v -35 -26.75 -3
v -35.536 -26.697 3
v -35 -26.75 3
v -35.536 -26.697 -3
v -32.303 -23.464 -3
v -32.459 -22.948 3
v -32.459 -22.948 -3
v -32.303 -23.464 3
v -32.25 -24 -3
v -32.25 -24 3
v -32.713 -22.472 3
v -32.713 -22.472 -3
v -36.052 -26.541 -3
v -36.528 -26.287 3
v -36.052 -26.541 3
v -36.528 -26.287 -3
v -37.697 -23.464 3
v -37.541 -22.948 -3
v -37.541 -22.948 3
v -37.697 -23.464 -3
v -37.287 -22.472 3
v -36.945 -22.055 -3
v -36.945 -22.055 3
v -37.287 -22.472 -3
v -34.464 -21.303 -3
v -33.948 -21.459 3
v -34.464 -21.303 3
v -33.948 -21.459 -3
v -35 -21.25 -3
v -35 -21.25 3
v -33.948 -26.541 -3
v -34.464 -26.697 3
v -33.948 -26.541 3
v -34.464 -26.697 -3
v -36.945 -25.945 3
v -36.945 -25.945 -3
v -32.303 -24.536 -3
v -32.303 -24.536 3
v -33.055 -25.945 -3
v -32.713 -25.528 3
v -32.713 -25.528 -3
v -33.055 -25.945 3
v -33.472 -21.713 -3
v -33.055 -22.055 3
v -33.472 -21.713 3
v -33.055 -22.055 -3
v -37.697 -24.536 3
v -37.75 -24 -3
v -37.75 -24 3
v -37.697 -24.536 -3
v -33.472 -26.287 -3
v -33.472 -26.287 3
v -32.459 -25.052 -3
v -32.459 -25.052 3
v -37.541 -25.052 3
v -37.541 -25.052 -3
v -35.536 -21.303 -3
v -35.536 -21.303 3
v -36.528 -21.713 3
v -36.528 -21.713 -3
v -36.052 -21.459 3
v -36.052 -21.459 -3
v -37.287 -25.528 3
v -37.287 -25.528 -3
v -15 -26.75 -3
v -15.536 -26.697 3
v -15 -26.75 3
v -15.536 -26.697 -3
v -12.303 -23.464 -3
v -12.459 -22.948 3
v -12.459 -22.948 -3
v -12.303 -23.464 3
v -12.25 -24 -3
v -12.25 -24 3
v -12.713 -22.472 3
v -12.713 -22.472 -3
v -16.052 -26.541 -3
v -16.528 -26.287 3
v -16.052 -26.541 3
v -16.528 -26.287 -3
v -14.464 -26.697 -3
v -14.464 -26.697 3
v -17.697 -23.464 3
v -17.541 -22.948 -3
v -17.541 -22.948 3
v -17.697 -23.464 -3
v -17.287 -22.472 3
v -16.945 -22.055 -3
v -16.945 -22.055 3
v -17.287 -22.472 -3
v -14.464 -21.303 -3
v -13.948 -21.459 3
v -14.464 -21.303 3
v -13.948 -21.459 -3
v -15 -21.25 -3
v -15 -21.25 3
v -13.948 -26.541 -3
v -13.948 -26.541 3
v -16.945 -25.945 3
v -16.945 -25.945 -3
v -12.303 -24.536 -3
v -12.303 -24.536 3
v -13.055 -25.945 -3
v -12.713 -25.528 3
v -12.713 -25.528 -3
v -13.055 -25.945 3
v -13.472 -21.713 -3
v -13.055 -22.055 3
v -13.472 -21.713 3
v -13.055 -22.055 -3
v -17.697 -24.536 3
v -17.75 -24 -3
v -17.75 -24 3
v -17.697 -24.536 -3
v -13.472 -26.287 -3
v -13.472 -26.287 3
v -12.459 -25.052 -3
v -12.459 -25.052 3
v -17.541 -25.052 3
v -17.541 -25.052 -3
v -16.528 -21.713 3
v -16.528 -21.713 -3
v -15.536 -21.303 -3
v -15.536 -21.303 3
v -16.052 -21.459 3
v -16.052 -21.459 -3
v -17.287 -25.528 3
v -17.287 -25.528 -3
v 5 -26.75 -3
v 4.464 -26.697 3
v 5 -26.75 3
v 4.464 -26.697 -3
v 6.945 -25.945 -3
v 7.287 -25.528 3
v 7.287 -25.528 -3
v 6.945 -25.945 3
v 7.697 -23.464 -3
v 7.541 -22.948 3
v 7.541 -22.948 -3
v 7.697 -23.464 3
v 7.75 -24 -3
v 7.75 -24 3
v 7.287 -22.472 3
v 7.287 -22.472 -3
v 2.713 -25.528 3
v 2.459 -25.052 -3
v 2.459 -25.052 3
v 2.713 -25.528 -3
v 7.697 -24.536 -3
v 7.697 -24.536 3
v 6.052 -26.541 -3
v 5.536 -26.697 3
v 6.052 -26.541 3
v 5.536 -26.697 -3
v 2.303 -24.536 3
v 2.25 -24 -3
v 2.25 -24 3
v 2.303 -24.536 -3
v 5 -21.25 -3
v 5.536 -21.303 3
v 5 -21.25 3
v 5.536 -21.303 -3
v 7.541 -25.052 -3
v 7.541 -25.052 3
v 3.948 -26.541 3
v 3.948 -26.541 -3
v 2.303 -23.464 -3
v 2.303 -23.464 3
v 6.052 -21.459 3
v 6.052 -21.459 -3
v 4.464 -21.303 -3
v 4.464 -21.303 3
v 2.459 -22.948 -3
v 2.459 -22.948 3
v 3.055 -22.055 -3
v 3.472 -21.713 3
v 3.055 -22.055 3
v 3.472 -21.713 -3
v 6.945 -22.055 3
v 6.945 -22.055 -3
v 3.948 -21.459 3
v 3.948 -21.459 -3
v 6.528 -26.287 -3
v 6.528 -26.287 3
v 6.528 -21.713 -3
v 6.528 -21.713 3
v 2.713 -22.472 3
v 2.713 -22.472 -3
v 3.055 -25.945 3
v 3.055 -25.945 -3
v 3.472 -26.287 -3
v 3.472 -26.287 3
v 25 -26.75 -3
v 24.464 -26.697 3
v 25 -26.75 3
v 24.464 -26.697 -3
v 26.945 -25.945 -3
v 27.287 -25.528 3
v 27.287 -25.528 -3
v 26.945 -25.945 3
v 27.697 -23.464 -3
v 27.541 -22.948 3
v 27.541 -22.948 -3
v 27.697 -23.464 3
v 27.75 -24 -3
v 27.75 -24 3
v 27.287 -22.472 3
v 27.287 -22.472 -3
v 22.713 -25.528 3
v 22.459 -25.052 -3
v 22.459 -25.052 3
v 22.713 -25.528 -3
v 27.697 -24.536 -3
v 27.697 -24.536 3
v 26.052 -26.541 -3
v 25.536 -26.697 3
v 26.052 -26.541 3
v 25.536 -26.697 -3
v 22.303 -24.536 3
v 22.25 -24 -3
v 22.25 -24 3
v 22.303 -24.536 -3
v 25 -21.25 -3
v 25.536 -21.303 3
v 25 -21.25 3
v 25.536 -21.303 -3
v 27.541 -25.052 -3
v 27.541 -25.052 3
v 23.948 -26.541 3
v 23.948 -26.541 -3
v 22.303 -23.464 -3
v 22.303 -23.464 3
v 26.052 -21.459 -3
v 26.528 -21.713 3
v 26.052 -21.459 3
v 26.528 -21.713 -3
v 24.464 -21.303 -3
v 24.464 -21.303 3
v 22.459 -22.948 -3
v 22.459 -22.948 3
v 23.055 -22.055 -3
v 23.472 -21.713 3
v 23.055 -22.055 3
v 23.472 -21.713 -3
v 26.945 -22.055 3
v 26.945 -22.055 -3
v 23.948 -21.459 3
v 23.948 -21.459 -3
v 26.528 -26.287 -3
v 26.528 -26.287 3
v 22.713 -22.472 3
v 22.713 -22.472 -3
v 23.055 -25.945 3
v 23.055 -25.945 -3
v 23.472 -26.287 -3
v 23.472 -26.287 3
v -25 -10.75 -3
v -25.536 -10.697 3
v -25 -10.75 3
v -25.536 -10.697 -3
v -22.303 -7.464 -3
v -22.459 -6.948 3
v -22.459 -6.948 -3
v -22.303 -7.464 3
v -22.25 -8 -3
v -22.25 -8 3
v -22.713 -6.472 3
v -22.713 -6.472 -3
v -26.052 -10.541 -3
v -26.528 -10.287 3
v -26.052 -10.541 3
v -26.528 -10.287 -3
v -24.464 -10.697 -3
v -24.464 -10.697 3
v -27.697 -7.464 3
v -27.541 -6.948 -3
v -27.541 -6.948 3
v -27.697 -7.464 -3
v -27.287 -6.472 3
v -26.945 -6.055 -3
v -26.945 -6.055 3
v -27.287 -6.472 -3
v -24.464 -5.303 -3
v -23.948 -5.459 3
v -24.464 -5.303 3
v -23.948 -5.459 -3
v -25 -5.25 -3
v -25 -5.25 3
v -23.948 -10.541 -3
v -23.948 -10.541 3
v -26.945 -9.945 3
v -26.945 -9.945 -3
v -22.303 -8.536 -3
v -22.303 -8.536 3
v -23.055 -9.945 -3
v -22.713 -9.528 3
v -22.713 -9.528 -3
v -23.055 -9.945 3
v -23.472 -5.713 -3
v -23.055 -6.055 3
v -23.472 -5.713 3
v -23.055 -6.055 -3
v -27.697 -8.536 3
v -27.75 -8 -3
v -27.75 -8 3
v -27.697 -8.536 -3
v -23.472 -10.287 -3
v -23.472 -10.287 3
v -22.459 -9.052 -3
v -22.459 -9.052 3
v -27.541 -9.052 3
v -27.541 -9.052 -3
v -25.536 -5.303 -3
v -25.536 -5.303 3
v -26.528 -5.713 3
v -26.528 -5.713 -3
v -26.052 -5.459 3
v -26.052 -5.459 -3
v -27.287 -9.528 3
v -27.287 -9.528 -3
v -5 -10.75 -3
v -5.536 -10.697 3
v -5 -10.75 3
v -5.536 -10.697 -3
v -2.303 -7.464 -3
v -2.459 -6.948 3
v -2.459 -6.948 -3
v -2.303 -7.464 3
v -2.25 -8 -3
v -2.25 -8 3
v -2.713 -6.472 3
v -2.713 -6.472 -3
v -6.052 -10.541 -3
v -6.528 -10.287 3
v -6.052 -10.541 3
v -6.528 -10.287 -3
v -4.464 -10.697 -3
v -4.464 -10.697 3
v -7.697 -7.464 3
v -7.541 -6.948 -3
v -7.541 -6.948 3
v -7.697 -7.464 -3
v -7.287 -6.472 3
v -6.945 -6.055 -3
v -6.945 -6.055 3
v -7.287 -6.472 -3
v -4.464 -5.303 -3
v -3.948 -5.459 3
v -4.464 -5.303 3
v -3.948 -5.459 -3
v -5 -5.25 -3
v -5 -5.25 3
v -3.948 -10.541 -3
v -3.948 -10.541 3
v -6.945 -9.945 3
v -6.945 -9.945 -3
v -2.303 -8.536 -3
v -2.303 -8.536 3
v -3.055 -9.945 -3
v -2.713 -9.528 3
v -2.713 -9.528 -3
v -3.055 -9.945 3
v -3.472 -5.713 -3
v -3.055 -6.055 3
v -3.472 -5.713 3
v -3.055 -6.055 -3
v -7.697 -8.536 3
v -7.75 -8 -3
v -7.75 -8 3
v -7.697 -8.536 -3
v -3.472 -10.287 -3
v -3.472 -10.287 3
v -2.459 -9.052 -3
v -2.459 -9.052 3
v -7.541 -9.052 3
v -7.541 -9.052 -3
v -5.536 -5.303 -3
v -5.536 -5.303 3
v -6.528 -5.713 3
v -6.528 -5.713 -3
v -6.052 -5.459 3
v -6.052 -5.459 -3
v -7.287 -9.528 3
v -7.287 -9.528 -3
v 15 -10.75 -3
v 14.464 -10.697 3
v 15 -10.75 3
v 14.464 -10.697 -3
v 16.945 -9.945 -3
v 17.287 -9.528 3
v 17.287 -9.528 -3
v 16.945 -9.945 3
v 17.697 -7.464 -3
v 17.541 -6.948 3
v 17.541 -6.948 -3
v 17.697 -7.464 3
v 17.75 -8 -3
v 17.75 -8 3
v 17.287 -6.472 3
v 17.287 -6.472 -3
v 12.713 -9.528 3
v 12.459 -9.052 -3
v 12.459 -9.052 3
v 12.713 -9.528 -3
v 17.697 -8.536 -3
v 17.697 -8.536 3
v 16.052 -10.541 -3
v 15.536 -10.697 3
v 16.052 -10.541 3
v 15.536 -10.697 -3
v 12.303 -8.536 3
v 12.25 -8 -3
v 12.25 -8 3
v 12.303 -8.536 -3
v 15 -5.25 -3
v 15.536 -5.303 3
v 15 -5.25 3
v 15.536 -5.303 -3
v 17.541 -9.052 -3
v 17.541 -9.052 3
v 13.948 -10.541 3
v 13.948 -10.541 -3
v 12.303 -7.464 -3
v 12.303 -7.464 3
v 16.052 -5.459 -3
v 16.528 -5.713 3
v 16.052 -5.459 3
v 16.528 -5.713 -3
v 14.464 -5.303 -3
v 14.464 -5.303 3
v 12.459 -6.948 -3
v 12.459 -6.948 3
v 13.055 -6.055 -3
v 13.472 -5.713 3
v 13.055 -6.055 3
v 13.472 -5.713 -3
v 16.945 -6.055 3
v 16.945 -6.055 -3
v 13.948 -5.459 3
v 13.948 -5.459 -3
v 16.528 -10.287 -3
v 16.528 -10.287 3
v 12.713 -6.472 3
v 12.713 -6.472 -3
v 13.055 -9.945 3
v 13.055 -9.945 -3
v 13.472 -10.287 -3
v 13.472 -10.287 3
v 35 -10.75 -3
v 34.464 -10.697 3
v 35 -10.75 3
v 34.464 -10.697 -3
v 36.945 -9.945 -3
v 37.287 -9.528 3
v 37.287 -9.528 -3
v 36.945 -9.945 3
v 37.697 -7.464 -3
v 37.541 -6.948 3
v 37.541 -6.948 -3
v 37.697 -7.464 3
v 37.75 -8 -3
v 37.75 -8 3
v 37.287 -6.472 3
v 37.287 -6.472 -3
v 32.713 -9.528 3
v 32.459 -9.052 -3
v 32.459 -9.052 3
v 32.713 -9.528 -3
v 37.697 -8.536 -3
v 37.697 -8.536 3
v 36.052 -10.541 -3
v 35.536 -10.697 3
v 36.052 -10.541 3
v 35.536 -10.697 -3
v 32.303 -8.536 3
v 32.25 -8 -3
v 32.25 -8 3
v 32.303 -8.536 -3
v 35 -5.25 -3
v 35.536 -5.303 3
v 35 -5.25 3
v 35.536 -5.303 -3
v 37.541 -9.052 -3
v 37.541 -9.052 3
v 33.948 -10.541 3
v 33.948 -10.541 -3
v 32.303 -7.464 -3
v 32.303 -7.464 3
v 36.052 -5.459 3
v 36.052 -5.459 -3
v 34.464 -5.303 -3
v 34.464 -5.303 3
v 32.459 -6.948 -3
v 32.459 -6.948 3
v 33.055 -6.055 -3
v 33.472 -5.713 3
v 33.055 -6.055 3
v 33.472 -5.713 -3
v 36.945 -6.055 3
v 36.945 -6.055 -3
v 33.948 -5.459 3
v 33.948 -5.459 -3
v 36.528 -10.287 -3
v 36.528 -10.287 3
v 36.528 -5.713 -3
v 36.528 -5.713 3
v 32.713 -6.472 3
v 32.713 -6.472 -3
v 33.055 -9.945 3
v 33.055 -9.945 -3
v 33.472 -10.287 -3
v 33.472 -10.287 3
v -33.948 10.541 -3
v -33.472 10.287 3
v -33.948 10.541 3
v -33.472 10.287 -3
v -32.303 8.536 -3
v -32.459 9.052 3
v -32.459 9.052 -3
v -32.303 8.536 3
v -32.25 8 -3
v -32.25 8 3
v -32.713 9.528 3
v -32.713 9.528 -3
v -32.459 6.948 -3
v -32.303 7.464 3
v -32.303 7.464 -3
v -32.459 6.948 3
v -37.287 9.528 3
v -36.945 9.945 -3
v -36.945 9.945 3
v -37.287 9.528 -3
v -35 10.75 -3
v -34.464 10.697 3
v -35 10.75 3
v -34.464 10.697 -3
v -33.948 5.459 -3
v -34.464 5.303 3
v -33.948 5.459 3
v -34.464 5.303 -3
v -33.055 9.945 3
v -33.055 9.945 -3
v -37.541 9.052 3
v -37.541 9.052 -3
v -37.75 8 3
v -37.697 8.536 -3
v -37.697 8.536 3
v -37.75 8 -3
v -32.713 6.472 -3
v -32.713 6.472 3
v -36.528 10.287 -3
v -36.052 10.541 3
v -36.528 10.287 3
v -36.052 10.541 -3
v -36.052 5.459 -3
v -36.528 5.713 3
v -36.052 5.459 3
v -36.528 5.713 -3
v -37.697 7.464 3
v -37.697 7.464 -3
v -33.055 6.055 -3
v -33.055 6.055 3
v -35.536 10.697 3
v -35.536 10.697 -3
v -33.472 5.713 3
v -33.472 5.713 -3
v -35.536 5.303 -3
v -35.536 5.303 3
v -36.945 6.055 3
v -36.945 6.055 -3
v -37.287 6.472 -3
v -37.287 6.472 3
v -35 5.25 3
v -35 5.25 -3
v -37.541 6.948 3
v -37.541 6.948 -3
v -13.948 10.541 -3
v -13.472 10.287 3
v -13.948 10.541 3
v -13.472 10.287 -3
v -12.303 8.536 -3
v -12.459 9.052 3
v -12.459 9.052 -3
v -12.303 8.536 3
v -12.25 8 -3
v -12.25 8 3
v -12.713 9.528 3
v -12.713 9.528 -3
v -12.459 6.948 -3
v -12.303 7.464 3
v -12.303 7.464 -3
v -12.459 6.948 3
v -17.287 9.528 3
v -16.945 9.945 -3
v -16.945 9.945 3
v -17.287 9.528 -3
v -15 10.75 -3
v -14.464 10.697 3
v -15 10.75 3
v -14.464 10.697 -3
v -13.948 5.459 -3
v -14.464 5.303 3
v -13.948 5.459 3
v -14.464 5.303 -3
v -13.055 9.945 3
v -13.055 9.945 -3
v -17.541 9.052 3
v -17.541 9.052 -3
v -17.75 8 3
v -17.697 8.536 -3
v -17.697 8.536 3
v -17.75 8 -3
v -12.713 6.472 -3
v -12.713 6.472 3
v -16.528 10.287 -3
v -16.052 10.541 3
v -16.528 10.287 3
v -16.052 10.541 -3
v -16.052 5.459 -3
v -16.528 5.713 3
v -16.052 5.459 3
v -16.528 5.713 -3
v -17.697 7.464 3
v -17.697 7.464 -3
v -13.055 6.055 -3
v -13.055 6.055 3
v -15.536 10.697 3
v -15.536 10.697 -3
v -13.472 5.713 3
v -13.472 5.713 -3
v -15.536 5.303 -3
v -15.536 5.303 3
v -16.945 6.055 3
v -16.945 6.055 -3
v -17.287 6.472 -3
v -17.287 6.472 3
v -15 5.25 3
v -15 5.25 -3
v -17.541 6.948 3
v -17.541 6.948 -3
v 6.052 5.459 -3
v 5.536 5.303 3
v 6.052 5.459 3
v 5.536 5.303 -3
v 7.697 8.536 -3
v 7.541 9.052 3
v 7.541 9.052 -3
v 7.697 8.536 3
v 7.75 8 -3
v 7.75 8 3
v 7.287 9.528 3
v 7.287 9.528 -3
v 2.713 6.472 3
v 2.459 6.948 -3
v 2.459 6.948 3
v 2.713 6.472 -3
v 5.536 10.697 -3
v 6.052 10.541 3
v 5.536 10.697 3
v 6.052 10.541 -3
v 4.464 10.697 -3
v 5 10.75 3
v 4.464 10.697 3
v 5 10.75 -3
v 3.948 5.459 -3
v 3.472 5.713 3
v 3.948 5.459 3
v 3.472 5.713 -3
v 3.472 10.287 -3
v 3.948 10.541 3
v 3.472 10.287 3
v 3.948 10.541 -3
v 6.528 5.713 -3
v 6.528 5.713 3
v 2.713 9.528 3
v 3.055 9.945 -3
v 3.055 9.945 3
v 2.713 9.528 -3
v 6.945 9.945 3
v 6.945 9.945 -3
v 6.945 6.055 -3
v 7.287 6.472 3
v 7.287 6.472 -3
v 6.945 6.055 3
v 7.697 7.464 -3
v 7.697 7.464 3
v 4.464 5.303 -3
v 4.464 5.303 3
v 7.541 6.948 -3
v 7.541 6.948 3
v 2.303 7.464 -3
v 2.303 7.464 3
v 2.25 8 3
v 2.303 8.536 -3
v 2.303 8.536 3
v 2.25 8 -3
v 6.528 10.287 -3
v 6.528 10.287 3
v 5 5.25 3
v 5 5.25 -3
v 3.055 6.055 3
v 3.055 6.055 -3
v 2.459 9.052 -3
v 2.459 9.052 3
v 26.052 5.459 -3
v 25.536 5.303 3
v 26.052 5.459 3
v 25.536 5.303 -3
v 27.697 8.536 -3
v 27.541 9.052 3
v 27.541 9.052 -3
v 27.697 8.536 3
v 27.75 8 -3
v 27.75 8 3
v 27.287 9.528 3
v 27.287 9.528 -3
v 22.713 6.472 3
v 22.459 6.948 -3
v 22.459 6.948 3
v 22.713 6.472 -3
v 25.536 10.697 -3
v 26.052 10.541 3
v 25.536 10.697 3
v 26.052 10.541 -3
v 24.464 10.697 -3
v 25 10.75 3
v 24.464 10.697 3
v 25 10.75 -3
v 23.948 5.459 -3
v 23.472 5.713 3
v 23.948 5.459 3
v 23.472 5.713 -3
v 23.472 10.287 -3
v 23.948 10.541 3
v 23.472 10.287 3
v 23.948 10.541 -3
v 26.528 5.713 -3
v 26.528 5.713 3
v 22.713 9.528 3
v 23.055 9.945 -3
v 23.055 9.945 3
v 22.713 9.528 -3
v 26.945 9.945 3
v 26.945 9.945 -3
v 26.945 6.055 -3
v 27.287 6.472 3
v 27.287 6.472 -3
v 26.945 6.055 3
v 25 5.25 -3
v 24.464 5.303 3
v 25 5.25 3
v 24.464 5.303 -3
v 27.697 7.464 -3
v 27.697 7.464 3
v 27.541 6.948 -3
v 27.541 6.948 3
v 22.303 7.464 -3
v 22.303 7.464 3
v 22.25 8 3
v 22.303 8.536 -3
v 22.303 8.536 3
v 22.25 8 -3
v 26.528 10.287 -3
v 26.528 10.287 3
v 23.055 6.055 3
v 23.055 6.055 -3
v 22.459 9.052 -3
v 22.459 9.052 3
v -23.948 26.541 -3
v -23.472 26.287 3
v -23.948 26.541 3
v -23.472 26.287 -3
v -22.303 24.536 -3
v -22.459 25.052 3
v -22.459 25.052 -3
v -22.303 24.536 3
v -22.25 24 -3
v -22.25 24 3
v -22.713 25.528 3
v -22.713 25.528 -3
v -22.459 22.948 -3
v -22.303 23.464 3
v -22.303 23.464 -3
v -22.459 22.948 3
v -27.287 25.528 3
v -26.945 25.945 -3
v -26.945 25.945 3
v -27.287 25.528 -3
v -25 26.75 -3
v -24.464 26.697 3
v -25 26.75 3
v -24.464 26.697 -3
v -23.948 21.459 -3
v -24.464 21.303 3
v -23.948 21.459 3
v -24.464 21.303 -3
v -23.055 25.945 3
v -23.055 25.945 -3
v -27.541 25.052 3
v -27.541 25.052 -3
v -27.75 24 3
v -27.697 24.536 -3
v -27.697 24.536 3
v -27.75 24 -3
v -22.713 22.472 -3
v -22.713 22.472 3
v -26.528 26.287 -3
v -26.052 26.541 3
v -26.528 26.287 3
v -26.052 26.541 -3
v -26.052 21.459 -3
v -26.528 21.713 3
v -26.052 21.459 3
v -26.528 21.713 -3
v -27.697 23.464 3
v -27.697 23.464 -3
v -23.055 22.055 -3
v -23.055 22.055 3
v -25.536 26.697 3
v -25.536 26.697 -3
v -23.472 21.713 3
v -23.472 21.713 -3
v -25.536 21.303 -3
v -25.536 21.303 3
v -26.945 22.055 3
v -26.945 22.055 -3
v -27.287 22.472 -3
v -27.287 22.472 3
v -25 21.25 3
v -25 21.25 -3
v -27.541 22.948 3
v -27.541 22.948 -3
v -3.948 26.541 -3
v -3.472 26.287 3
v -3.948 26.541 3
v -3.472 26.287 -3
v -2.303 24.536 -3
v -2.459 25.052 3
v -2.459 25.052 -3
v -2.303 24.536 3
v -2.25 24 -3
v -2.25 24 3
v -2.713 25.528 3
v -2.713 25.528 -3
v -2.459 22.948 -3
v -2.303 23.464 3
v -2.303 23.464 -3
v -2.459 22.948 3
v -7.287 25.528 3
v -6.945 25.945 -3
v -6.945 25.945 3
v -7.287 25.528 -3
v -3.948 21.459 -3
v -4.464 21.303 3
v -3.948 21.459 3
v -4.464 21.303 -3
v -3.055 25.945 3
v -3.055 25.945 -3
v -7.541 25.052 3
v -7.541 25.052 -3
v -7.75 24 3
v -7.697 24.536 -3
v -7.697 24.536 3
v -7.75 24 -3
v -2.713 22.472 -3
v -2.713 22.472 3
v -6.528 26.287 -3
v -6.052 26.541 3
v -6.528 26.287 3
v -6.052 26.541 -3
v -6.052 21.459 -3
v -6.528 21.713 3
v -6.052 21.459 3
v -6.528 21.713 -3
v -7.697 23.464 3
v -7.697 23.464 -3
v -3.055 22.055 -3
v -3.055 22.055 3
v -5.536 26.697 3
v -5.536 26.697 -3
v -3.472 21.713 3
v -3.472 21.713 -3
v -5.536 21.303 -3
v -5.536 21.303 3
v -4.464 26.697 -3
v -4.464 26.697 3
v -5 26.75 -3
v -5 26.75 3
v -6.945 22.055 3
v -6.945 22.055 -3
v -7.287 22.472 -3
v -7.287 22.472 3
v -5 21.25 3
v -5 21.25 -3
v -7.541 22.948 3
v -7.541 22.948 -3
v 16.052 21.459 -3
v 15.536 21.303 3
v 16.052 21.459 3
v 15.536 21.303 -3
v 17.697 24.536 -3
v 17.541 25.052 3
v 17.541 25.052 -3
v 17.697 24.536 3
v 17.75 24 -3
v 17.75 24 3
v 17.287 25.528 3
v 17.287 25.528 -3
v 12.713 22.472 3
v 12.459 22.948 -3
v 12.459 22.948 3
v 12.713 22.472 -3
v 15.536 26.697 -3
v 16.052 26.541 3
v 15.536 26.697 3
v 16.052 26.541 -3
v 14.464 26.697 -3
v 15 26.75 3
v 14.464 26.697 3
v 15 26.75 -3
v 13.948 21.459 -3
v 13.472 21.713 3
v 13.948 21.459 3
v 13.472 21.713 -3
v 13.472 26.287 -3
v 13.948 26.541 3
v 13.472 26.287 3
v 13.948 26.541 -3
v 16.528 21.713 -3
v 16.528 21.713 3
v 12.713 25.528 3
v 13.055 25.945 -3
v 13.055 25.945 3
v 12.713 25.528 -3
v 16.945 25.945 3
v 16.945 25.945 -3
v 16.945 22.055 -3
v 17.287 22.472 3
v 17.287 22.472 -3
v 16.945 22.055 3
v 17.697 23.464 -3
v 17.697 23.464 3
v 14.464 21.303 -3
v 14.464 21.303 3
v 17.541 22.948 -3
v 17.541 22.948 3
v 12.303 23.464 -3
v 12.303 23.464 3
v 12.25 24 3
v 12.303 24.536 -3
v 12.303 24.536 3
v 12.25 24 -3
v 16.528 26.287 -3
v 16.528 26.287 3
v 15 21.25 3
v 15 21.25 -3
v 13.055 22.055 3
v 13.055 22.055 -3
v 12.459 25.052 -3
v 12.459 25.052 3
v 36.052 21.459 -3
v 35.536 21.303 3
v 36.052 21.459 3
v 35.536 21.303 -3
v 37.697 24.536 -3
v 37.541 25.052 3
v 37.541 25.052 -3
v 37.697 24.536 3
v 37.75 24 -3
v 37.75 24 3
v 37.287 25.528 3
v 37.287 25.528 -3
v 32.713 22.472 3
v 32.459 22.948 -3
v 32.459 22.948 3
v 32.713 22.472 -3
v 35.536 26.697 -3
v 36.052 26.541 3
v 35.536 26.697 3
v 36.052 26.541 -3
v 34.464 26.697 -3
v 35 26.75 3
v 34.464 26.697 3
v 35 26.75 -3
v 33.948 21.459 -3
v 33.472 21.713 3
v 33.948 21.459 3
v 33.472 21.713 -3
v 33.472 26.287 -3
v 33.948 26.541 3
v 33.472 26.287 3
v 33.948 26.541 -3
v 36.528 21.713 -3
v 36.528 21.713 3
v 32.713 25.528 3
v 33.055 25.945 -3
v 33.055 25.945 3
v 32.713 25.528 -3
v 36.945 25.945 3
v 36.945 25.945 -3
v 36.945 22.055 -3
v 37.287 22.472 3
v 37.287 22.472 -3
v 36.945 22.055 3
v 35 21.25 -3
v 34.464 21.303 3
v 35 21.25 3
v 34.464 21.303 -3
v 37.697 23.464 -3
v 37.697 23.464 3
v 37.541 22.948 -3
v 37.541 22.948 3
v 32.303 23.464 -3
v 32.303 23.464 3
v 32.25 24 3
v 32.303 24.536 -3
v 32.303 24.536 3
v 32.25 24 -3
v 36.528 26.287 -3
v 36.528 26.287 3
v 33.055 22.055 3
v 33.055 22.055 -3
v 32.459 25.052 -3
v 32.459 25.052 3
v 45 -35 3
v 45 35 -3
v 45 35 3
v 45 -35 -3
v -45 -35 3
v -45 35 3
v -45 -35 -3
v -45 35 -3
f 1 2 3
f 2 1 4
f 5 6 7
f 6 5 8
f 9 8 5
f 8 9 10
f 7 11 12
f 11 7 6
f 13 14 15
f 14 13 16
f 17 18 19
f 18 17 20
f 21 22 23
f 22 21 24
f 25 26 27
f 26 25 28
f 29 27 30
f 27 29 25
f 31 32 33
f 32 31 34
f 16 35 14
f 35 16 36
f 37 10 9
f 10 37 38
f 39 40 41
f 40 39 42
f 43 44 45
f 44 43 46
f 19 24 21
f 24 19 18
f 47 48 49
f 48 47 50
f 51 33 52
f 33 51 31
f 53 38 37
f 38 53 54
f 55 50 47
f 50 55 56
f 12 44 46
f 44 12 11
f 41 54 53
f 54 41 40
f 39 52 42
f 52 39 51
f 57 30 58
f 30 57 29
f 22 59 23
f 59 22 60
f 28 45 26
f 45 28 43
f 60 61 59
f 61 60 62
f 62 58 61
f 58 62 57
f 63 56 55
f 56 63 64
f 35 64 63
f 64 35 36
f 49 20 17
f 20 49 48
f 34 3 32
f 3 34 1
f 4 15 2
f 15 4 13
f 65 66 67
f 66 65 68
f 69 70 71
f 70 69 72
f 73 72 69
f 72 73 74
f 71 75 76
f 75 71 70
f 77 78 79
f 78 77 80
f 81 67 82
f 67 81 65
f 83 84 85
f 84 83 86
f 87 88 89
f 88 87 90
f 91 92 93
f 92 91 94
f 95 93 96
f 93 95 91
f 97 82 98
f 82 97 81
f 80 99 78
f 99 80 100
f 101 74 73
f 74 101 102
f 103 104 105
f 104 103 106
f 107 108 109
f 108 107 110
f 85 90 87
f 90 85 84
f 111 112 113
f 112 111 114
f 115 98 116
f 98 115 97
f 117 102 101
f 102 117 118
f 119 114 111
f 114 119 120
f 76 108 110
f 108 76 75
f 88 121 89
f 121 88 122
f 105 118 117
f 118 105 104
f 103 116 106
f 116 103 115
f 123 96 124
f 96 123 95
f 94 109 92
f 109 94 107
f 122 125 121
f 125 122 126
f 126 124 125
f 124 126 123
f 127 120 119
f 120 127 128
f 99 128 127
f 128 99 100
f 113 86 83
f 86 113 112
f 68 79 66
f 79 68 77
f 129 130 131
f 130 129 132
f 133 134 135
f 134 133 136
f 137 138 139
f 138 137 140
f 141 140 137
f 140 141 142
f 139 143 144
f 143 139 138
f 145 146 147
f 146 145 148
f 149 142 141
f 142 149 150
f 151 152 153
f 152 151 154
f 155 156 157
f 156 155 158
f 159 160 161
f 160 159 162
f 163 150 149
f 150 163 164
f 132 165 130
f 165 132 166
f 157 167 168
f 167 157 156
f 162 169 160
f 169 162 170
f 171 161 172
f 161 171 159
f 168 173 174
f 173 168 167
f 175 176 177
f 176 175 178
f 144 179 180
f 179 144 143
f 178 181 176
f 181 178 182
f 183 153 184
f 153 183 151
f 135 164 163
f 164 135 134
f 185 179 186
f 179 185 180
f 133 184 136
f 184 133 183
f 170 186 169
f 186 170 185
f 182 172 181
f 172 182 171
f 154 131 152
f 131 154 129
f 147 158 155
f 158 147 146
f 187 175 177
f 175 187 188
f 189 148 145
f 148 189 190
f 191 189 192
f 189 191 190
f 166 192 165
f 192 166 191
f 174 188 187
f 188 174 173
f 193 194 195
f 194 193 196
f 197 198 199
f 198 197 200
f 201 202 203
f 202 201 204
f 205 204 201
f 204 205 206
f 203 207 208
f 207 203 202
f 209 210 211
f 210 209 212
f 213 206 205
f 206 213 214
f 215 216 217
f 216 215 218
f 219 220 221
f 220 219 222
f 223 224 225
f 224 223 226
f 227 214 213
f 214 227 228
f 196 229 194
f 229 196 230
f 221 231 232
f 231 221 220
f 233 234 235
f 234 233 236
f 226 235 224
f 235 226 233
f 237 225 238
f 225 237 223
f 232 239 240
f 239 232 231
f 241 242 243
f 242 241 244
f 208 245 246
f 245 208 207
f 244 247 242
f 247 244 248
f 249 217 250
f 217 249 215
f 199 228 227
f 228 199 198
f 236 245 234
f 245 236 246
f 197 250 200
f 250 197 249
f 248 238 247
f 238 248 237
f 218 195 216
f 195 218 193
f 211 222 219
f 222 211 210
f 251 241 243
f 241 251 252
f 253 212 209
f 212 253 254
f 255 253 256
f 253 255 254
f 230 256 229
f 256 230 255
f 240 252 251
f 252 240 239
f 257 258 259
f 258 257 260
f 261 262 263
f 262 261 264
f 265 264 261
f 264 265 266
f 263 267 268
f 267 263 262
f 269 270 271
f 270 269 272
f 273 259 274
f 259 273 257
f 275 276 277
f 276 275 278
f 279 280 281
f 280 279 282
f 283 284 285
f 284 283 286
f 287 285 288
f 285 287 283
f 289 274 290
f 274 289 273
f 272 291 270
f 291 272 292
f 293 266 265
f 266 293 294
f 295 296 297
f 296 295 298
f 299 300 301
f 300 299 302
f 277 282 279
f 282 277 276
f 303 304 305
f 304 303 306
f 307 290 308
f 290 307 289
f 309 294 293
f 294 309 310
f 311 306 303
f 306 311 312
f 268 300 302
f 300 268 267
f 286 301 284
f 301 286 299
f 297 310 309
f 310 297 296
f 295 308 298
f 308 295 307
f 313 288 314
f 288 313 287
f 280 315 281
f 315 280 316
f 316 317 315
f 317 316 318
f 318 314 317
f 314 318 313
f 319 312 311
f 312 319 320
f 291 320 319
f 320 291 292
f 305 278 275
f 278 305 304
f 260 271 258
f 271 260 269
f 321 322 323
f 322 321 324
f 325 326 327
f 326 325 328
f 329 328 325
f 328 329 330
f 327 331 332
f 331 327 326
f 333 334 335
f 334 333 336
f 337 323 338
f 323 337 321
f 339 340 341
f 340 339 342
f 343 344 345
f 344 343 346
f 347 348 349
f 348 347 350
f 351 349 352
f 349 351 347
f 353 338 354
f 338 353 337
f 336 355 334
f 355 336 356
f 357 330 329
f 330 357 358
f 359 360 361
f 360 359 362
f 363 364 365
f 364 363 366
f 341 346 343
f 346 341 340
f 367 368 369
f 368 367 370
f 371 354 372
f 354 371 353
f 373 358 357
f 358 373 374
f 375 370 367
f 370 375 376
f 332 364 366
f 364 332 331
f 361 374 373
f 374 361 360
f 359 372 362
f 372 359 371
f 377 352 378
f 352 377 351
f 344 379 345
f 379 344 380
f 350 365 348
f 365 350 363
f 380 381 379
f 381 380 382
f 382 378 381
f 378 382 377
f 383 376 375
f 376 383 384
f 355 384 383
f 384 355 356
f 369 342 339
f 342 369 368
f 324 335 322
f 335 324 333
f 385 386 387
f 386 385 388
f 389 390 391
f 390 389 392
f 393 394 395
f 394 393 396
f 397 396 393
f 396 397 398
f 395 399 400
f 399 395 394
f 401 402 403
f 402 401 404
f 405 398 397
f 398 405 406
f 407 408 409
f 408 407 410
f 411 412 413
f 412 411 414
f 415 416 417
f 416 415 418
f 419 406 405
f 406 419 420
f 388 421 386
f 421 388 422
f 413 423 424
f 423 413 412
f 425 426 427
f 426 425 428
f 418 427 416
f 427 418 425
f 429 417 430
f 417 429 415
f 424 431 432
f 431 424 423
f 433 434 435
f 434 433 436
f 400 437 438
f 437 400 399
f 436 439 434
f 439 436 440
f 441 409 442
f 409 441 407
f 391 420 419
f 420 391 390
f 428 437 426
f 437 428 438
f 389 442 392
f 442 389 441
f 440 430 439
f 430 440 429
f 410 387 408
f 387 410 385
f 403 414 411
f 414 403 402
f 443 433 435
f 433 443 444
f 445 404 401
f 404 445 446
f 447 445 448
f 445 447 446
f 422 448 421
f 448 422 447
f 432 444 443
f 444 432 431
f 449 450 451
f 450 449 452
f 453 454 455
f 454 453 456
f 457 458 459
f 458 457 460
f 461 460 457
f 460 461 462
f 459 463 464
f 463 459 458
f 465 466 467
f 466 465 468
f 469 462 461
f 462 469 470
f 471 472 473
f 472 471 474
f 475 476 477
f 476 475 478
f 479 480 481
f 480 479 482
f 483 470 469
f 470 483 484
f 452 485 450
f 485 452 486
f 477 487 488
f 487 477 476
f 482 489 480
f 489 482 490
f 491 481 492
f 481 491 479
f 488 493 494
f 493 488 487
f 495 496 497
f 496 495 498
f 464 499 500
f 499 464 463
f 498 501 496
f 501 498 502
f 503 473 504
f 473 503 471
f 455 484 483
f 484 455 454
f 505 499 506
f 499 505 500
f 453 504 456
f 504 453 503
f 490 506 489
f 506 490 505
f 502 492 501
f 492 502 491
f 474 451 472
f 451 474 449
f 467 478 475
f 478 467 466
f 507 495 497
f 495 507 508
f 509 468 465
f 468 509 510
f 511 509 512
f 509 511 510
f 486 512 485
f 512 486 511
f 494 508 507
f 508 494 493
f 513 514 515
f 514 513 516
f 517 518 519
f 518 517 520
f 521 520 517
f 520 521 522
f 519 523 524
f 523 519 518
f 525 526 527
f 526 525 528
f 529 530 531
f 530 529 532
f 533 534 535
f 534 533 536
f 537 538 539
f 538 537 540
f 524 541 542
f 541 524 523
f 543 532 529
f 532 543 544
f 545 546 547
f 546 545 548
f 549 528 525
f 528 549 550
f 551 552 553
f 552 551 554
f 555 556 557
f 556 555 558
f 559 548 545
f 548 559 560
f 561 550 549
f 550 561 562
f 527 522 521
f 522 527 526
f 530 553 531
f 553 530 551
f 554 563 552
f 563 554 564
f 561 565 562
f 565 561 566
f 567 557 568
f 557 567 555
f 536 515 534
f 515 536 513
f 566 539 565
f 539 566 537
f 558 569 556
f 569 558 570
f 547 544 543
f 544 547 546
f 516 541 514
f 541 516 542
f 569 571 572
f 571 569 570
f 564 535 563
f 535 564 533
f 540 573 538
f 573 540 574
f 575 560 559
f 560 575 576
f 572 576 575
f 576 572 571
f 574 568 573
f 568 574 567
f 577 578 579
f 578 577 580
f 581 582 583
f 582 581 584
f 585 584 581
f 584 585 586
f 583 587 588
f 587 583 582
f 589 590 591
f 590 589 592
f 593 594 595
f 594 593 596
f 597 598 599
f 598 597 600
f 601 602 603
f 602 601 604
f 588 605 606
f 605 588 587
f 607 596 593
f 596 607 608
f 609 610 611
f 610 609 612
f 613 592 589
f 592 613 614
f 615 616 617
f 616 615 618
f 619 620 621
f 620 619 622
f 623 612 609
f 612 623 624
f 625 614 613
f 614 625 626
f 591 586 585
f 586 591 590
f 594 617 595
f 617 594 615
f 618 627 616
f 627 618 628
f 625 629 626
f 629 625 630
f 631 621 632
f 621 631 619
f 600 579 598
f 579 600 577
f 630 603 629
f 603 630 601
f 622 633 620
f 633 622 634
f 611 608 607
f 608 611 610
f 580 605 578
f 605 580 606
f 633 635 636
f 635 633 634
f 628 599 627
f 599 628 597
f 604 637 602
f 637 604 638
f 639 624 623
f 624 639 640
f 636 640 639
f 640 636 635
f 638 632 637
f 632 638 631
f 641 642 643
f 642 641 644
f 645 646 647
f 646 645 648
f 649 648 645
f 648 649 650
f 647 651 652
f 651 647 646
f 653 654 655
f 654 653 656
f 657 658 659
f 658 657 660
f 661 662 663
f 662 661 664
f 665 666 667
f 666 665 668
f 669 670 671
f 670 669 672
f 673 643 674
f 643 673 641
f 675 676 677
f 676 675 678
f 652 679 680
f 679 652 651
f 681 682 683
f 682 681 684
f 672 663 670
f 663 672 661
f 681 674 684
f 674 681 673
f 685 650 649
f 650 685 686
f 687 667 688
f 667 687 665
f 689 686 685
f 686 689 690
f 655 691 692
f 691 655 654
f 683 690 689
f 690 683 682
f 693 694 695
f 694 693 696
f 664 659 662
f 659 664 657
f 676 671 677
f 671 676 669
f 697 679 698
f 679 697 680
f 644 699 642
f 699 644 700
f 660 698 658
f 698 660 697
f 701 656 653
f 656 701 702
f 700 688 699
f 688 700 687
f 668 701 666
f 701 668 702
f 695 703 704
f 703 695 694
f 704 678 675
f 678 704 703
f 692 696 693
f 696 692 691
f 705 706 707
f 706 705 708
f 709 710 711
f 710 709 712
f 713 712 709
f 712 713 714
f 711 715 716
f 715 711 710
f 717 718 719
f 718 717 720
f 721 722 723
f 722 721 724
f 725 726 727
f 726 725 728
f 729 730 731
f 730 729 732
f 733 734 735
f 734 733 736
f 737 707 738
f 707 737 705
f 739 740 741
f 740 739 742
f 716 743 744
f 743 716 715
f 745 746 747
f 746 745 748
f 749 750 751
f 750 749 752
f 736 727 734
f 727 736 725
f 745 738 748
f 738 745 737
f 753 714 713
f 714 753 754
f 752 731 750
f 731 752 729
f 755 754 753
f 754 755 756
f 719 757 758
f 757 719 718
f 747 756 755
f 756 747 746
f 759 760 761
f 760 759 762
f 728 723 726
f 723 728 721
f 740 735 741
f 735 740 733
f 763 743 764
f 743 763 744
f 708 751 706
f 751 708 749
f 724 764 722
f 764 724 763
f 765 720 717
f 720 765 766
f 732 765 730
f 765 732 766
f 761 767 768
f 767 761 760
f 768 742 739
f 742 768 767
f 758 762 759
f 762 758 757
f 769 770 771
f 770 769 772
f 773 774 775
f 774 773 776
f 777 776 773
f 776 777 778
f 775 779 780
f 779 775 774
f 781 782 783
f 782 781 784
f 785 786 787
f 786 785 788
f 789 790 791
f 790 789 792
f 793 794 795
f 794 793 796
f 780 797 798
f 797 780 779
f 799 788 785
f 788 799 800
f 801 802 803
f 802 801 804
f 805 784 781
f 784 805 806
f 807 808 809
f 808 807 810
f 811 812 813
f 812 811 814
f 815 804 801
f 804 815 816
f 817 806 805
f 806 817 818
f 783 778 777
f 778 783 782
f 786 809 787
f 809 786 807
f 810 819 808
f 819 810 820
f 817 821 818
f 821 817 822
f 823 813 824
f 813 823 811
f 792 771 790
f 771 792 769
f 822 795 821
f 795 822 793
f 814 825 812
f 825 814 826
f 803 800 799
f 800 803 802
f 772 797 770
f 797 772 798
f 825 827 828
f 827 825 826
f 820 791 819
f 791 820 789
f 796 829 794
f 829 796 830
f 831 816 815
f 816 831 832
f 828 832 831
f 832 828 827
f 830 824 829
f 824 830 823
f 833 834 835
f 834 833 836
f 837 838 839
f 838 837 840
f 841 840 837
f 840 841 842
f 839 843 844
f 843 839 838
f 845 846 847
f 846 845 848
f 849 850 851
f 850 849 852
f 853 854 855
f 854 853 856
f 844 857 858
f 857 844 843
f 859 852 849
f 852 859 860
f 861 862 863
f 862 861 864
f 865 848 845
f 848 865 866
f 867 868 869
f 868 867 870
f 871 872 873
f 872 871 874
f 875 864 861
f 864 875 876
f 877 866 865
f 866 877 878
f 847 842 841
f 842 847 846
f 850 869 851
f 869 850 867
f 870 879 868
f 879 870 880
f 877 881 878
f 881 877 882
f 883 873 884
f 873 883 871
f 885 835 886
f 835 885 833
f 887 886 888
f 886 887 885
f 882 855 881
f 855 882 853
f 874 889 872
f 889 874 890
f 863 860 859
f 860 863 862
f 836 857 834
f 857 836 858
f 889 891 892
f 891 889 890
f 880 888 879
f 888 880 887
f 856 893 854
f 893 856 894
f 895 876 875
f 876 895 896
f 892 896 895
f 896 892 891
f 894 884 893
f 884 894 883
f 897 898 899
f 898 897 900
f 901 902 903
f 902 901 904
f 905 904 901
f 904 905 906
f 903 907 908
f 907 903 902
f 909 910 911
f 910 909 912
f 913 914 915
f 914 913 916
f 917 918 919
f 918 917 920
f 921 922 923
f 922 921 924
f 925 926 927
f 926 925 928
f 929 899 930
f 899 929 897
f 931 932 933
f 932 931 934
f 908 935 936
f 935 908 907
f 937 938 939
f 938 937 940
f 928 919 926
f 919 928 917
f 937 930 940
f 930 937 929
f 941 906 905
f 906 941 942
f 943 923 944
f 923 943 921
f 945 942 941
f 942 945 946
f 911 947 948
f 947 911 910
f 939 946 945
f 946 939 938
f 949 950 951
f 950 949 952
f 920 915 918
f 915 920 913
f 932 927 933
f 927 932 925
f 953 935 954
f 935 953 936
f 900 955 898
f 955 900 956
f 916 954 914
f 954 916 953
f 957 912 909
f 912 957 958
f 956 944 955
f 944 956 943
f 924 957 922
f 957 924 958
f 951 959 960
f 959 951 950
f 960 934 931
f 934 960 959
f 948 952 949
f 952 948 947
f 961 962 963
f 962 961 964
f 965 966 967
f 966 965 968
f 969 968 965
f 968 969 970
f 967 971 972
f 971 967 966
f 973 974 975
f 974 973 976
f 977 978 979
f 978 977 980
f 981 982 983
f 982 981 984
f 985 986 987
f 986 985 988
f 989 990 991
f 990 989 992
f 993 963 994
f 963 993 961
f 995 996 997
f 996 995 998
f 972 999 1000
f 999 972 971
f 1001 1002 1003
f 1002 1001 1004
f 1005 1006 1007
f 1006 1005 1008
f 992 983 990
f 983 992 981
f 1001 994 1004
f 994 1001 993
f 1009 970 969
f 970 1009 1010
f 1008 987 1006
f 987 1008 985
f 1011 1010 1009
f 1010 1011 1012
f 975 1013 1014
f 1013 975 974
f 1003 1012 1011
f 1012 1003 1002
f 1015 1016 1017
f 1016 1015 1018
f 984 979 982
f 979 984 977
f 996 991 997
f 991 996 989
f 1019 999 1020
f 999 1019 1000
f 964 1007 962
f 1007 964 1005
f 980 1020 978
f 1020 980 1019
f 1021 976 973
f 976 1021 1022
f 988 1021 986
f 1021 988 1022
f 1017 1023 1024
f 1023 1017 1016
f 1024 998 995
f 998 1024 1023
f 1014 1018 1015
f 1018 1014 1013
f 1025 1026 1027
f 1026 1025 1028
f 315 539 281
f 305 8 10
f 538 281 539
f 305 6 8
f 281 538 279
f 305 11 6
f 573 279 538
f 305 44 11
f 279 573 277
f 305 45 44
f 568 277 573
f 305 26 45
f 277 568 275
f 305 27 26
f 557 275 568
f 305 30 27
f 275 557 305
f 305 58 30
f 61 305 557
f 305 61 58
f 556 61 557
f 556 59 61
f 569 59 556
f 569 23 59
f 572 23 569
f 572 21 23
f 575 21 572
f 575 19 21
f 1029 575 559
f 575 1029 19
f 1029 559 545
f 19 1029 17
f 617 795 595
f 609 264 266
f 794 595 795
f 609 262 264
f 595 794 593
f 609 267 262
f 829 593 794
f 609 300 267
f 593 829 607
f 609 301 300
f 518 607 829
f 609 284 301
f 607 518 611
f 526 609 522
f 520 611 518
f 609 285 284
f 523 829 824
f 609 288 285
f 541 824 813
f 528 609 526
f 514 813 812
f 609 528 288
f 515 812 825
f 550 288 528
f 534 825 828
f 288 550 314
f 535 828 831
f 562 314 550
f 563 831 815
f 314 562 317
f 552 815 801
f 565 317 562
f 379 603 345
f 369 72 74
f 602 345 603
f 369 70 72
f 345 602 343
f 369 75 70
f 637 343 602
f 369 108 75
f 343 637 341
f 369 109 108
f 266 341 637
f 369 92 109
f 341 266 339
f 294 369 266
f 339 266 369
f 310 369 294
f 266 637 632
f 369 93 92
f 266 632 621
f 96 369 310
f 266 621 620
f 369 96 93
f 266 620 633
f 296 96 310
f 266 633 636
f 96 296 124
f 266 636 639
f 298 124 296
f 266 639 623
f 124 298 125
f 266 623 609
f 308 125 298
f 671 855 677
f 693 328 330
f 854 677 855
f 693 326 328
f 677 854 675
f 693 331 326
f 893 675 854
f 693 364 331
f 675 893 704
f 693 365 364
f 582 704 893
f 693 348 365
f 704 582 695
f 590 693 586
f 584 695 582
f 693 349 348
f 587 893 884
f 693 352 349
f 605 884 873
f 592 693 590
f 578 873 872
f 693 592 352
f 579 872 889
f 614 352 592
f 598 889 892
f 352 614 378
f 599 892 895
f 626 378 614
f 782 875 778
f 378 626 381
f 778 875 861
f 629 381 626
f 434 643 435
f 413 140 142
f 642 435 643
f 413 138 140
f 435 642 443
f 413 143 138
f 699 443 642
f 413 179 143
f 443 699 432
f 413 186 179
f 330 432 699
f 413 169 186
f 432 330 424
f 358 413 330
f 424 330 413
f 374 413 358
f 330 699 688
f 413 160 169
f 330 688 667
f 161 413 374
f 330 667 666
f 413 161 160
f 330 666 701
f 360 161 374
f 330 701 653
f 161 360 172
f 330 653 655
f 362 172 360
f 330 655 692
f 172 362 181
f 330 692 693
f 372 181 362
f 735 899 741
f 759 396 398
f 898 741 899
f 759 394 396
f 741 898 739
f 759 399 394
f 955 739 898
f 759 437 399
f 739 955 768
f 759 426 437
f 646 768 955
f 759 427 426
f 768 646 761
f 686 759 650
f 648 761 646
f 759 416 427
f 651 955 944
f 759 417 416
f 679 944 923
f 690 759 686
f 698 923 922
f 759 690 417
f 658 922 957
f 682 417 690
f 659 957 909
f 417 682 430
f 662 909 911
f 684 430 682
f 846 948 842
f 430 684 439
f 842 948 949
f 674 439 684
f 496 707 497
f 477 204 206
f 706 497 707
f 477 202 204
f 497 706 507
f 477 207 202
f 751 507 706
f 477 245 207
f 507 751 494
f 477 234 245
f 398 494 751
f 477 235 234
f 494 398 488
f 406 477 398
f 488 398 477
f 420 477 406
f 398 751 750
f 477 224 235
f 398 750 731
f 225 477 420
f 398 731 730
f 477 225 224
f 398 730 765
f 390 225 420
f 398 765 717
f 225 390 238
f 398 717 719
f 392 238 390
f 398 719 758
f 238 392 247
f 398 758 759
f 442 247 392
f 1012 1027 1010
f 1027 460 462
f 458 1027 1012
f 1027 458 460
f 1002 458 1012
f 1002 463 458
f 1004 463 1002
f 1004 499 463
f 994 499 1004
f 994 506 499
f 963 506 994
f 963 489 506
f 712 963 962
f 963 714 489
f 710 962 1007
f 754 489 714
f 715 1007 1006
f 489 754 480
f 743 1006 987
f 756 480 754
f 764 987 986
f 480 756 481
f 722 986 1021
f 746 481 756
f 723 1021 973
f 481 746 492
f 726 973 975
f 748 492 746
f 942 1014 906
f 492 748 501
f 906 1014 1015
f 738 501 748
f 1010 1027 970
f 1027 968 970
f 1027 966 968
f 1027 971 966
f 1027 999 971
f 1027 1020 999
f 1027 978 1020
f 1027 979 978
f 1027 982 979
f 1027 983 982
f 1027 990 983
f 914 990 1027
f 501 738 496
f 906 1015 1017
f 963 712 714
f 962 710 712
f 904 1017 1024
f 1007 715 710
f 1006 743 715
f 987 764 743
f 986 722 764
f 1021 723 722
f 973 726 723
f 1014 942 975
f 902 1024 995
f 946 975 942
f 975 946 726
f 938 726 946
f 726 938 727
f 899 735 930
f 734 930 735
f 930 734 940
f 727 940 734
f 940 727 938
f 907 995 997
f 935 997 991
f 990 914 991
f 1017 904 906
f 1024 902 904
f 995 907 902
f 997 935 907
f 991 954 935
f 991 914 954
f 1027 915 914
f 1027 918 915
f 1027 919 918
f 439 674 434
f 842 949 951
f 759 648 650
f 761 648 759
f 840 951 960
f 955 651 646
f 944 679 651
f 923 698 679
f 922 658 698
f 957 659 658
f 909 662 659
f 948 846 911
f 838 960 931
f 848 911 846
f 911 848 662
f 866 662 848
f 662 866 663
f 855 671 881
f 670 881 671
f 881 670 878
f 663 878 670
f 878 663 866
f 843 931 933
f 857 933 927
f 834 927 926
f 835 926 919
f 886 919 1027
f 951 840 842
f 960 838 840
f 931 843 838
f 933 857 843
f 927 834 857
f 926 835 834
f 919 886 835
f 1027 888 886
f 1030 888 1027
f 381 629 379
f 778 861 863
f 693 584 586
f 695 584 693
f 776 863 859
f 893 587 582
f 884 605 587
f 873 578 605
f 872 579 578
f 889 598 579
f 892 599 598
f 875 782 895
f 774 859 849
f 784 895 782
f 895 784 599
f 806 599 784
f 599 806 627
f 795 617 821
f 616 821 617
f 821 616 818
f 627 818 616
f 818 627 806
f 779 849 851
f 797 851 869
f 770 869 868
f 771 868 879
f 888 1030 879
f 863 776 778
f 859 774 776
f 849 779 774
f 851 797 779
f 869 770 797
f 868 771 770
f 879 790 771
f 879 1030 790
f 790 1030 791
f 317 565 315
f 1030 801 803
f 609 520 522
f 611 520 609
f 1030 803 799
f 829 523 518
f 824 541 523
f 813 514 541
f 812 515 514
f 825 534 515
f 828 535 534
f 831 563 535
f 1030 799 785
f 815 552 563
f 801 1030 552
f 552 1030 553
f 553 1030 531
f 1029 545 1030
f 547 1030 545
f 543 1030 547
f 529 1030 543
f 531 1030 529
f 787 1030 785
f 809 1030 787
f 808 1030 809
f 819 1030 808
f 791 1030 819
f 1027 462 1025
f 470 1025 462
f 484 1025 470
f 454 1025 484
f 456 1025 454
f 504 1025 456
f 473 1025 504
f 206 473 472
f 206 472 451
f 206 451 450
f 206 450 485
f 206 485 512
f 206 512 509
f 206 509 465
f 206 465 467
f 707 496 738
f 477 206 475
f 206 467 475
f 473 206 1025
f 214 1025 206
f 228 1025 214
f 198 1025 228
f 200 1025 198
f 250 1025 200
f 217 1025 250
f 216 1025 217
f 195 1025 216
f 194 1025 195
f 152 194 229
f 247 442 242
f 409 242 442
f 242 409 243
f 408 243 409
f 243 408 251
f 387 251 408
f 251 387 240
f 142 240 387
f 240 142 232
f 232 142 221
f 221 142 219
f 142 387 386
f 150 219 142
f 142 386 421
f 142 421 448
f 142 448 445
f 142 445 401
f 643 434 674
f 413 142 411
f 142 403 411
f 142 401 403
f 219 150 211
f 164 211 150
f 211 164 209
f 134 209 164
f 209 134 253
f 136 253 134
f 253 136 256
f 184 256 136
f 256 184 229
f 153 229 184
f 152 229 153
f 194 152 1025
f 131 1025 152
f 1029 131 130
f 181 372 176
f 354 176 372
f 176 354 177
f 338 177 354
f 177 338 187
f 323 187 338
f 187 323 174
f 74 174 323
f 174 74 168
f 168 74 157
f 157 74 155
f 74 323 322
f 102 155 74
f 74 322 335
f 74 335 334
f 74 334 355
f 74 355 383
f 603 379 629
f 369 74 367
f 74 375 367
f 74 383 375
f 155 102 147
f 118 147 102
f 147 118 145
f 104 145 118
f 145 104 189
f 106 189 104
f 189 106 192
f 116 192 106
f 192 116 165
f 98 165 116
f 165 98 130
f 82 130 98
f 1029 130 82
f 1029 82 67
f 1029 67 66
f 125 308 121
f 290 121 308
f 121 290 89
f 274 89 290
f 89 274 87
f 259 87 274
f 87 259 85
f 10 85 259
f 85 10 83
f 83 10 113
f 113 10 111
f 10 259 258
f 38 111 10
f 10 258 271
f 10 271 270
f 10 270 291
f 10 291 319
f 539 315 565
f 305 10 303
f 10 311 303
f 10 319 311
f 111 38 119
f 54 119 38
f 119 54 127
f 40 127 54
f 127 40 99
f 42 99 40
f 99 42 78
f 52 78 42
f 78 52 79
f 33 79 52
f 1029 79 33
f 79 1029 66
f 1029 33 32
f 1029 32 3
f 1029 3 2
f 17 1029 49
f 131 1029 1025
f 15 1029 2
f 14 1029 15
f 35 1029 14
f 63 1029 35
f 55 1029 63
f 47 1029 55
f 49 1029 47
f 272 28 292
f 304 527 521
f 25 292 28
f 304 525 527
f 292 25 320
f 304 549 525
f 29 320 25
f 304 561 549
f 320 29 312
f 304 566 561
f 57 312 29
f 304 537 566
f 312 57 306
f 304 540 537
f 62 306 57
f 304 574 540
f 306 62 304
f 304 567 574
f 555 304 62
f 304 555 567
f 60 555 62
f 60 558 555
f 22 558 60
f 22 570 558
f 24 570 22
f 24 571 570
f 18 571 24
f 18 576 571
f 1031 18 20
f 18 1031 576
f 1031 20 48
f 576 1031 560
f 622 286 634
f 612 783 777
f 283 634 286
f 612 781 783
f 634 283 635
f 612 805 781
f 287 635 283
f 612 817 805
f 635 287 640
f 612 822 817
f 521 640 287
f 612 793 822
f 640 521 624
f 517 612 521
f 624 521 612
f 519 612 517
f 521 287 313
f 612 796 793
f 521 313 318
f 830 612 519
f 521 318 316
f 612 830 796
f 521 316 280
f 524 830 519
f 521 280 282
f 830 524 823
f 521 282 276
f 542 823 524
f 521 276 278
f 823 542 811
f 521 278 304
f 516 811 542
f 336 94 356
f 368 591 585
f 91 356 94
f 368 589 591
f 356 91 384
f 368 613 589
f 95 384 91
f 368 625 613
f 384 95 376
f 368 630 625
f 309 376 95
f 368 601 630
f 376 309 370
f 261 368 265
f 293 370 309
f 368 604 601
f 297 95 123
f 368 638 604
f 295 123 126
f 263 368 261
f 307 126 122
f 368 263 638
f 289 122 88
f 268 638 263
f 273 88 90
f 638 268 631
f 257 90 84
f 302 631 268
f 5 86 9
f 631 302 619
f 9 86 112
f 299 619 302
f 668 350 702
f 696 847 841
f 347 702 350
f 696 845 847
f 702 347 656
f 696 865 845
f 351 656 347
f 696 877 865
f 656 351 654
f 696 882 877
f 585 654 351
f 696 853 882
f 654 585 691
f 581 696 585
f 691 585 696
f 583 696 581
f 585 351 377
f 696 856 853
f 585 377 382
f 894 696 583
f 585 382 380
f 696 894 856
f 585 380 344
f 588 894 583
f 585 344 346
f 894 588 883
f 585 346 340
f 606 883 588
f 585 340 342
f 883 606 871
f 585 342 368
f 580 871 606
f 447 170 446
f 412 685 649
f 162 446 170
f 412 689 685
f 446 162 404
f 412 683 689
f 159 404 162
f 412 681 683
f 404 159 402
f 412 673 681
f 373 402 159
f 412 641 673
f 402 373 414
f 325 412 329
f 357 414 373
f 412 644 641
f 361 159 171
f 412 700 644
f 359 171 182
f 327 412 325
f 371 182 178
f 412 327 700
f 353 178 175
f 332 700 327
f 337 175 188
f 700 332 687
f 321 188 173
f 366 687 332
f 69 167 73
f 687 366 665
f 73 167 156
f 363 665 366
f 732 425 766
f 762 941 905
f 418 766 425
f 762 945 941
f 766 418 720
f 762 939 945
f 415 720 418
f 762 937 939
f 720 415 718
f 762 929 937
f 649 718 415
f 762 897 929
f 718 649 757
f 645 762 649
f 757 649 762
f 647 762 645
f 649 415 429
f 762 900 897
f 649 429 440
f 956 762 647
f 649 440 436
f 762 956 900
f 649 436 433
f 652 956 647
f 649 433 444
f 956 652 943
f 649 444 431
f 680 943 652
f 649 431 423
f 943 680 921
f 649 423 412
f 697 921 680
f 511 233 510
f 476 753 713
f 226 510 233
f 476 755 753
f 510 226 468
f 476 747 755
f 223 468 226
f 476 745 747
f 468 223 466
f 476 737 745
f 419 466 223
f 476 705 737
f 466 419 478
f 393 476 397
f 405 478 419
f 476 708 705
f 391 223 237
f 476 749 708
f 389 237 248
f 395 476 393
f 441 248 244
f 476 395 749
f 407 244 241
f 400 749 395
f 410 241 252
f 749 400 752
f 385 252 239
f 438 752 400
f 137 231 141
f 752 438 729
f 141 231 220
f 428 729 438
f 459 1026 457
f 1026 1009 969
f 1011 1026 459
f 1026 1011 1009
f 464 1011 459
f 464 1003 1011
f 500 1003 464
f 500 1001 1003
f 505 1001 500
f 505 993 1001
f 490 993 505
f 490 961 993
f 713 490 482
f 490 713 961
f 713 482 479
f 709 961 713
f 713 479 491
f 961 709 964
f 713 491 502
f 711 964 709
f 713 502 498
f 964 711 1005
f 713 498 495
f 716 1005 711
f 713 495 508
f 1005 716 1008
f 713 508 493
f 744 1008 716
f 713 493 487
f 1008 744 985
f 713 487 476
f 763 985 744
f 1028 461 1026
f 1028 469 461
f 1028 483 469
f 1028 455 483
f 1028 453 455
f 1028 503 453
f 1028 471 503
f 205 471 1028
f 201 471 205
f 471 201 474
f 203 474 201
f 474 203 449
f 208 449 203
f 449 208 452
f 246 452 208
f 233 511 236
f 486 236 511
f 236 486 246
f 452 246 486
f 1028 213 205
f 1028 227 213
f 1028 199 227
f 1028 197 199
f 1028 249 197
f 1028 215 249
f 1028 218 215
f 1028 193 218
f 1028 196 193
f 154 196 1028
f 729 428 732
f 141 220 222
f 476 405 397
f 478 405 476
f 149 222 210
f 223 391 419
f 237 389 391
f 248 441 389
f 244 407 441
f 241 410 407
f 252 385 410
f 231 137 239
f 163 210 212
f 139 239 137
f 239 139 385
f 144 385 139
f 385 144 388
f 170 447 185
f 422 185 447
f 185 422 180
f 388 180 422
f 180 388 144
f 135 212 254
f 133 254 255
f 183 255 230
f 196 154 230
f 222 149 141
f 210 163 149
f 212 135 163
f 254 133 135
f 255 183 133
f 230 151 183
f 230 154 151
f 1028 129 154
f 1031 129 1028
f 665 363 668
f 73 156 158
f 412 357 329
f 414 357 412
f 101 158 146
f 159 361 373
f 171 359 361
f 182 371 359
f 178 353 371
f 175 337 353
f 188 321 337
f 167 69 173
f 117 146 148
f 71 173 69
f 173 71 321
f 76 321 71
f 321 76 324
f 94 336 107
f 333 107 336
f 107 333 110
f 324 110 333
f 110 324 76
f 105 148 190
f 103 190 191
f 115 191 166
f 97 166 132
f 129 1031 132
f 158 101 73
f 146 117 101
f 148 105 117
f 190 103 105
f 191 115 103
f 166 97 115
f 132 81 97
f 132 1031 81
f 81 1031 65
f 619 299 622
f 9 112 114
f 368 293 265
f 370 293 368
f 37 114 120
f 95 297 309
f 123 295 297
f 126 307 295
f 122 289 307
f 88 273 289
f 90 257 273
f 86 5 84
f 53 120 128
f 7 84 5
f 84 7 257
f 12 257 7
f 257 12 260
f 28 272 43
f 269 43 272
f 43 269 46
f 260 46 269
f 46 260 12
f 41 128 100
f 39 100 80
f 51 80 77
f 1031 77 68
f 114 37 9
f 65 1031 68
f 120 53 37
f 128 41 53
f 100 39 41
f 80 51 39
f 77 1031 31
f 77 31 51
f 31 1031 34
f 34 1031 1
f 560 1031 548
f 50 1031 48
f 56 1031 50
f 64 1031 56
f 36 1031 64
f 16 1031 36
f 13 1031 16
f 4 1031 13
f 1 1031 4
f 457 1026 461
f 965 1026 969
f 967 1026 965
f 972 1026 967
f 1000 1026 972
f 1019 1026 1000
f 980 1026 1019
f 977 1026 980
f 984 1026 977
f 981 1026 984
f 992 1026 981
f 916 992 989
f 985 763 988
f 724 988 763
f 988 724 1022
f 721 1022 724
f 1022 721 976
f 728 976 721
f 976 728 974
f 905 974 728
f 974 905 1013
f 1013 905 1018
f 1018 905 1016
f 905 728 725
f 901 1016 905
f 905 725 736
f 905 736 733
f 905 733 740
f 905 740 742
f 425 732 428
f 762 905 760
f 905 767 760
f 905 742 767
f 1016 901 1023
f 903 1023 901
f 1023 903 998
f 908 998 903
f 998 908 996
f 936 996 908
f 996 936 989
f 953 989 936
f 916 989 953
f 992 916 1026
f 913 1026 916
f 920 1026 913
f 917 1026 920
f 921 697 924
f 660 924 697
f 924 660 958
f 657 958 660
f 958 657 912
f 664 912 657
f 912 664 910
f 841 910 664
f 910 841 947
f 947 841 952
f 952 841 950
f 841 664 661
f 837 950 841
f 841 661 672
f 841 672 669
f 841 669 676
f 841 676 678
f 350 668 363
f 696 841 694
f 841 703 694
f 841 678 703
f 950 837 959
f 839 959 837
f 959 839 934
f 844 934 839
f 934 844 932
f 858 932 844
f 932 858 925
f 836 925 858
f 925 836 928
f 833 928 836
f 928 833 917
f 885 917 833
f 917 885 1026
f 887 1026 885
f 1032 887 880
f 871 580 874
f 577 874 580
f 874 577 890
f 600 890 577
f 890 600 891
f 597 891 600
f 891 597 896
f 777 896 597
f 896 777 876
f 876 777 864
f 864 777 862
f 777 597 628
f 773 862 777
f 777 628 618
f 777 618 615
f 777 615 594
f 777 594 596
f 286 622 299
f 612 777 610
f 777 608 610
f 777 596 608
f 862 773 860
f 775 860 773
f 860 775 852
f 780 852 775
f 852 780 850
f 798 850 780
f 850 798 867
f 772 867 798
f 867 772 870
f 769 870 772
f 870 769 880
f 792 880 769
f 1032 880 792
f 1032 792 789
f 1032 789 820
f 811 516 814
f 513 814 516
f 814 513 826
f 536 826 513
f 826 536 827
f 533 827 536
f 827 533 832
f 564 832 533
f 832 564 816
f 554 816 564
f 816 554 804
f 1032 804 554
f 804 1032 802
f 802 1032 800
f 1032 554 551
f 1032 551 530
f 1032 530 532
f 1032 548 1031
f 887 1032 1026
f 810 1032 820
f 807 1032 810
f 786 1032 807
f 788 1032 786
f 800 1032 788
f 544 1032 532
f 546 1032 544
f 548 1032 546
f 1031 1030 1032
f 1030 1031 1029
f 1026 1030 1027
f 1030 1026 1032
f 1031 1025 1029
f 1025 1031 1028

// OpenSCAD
$fn = 32;

// ----------------------------------------------------------------------
// Perforated panel 90 x 70 x 6
// 4 x 4 Ø5.5 holes, checker layout
// ----------------------------------------------------------------------

// --- parameters (mm) ---
panel = [90, 70, 6];  // overall size (x, y, z)
hole_d = 5.5;         // hole diameter
pitch_x = 20;         // hole pitch along X
pitch_y = 16;         // hole pitch along Y

// --- derived feature positions (mm) ---
margin = hole_d / 2 + 2;            // = 4.75   clearance from the panel edge
row_offset = pitch_x / 2;           // = 10   shift of every other row
cols = floor((panel[0] - 2 * margin - row_offset) / pitch_x) + 1;  // = 4   how many columns fit in X
rows = floor((panel[1] - 2 * margin) / pitch_y) + 1;  // = 4   how many rows fit in Y
span_x = (cols - 1) * pitch_x + row_offset;  // = 70   width of the field
span_y = (rows - 1) * pitch_y;      // = 48   height of the field
origin_x = -span_x / 2;             // = -35   X of the first hole
origin_y = -span_y / 2;             // = -24   Y of the first row
holes = rows * cols;                // = 16   holes in total
feature_centers = [
  [origin_x + 0 * pitch_x, origin_y + 0 * pitch_y],
  [origin_x + 1 * pitch_x, origin_y + 0 * pitch_y],
  [origin_x + 2 * pitch_x, origin_y + 0 * pitch_y],
  [origin_x + 3 * pitch_x, origin_y + 0 * pitch_y],
  [origin_x + row_offset + 0 * pitch_x, origin_y + 1 * pitch_y],
  [origin_x + row_offset + 1 * pitch_x, origin_y + 1 * pitch_y],
  [origin_x + row_offset + 2 * pitch_x, origin_y + 1 * pitch_y],
  [origin_x + row_offset + 3 * pitch_x, origin_y + 1 * pitch_y],
  [origin_x + 0 * pitch_x, origin_y + 2 * pitch_y],
  [origin_x + 1 * pitch_x, origin_y + 2 * pitch_y],
  [origin_x + 2 * pitch_x, origin_y + 2 * pitch_y],
  [origin_x + 3 * pitch_x, origin_y + 2 * pitch_y],
  [origin_x + row_offset + 0 * pitch_x, origin_y + 3 * pitch_y],
  [origin_x + row_offset + 1 * pitch_x, origin_y + 3 * pitch_y],
  [origin_x + row_offset + 2 * pitch_x, origin_y + 3 * pitch_y],
  [origin_x + row_offset + 3 * pitch_x, origin_y + 3 * pitch_y]
];   // hole centres, used verbatim by the cutter loop

// panel outline, every hole through
difference() {
  cube(panel, center = true);
  for (centre = feature_centers)
    translate([centre[0], centre[1], 0])
      cylinder(d = hole_d, h = panel[2] + 2, center = true);
}
